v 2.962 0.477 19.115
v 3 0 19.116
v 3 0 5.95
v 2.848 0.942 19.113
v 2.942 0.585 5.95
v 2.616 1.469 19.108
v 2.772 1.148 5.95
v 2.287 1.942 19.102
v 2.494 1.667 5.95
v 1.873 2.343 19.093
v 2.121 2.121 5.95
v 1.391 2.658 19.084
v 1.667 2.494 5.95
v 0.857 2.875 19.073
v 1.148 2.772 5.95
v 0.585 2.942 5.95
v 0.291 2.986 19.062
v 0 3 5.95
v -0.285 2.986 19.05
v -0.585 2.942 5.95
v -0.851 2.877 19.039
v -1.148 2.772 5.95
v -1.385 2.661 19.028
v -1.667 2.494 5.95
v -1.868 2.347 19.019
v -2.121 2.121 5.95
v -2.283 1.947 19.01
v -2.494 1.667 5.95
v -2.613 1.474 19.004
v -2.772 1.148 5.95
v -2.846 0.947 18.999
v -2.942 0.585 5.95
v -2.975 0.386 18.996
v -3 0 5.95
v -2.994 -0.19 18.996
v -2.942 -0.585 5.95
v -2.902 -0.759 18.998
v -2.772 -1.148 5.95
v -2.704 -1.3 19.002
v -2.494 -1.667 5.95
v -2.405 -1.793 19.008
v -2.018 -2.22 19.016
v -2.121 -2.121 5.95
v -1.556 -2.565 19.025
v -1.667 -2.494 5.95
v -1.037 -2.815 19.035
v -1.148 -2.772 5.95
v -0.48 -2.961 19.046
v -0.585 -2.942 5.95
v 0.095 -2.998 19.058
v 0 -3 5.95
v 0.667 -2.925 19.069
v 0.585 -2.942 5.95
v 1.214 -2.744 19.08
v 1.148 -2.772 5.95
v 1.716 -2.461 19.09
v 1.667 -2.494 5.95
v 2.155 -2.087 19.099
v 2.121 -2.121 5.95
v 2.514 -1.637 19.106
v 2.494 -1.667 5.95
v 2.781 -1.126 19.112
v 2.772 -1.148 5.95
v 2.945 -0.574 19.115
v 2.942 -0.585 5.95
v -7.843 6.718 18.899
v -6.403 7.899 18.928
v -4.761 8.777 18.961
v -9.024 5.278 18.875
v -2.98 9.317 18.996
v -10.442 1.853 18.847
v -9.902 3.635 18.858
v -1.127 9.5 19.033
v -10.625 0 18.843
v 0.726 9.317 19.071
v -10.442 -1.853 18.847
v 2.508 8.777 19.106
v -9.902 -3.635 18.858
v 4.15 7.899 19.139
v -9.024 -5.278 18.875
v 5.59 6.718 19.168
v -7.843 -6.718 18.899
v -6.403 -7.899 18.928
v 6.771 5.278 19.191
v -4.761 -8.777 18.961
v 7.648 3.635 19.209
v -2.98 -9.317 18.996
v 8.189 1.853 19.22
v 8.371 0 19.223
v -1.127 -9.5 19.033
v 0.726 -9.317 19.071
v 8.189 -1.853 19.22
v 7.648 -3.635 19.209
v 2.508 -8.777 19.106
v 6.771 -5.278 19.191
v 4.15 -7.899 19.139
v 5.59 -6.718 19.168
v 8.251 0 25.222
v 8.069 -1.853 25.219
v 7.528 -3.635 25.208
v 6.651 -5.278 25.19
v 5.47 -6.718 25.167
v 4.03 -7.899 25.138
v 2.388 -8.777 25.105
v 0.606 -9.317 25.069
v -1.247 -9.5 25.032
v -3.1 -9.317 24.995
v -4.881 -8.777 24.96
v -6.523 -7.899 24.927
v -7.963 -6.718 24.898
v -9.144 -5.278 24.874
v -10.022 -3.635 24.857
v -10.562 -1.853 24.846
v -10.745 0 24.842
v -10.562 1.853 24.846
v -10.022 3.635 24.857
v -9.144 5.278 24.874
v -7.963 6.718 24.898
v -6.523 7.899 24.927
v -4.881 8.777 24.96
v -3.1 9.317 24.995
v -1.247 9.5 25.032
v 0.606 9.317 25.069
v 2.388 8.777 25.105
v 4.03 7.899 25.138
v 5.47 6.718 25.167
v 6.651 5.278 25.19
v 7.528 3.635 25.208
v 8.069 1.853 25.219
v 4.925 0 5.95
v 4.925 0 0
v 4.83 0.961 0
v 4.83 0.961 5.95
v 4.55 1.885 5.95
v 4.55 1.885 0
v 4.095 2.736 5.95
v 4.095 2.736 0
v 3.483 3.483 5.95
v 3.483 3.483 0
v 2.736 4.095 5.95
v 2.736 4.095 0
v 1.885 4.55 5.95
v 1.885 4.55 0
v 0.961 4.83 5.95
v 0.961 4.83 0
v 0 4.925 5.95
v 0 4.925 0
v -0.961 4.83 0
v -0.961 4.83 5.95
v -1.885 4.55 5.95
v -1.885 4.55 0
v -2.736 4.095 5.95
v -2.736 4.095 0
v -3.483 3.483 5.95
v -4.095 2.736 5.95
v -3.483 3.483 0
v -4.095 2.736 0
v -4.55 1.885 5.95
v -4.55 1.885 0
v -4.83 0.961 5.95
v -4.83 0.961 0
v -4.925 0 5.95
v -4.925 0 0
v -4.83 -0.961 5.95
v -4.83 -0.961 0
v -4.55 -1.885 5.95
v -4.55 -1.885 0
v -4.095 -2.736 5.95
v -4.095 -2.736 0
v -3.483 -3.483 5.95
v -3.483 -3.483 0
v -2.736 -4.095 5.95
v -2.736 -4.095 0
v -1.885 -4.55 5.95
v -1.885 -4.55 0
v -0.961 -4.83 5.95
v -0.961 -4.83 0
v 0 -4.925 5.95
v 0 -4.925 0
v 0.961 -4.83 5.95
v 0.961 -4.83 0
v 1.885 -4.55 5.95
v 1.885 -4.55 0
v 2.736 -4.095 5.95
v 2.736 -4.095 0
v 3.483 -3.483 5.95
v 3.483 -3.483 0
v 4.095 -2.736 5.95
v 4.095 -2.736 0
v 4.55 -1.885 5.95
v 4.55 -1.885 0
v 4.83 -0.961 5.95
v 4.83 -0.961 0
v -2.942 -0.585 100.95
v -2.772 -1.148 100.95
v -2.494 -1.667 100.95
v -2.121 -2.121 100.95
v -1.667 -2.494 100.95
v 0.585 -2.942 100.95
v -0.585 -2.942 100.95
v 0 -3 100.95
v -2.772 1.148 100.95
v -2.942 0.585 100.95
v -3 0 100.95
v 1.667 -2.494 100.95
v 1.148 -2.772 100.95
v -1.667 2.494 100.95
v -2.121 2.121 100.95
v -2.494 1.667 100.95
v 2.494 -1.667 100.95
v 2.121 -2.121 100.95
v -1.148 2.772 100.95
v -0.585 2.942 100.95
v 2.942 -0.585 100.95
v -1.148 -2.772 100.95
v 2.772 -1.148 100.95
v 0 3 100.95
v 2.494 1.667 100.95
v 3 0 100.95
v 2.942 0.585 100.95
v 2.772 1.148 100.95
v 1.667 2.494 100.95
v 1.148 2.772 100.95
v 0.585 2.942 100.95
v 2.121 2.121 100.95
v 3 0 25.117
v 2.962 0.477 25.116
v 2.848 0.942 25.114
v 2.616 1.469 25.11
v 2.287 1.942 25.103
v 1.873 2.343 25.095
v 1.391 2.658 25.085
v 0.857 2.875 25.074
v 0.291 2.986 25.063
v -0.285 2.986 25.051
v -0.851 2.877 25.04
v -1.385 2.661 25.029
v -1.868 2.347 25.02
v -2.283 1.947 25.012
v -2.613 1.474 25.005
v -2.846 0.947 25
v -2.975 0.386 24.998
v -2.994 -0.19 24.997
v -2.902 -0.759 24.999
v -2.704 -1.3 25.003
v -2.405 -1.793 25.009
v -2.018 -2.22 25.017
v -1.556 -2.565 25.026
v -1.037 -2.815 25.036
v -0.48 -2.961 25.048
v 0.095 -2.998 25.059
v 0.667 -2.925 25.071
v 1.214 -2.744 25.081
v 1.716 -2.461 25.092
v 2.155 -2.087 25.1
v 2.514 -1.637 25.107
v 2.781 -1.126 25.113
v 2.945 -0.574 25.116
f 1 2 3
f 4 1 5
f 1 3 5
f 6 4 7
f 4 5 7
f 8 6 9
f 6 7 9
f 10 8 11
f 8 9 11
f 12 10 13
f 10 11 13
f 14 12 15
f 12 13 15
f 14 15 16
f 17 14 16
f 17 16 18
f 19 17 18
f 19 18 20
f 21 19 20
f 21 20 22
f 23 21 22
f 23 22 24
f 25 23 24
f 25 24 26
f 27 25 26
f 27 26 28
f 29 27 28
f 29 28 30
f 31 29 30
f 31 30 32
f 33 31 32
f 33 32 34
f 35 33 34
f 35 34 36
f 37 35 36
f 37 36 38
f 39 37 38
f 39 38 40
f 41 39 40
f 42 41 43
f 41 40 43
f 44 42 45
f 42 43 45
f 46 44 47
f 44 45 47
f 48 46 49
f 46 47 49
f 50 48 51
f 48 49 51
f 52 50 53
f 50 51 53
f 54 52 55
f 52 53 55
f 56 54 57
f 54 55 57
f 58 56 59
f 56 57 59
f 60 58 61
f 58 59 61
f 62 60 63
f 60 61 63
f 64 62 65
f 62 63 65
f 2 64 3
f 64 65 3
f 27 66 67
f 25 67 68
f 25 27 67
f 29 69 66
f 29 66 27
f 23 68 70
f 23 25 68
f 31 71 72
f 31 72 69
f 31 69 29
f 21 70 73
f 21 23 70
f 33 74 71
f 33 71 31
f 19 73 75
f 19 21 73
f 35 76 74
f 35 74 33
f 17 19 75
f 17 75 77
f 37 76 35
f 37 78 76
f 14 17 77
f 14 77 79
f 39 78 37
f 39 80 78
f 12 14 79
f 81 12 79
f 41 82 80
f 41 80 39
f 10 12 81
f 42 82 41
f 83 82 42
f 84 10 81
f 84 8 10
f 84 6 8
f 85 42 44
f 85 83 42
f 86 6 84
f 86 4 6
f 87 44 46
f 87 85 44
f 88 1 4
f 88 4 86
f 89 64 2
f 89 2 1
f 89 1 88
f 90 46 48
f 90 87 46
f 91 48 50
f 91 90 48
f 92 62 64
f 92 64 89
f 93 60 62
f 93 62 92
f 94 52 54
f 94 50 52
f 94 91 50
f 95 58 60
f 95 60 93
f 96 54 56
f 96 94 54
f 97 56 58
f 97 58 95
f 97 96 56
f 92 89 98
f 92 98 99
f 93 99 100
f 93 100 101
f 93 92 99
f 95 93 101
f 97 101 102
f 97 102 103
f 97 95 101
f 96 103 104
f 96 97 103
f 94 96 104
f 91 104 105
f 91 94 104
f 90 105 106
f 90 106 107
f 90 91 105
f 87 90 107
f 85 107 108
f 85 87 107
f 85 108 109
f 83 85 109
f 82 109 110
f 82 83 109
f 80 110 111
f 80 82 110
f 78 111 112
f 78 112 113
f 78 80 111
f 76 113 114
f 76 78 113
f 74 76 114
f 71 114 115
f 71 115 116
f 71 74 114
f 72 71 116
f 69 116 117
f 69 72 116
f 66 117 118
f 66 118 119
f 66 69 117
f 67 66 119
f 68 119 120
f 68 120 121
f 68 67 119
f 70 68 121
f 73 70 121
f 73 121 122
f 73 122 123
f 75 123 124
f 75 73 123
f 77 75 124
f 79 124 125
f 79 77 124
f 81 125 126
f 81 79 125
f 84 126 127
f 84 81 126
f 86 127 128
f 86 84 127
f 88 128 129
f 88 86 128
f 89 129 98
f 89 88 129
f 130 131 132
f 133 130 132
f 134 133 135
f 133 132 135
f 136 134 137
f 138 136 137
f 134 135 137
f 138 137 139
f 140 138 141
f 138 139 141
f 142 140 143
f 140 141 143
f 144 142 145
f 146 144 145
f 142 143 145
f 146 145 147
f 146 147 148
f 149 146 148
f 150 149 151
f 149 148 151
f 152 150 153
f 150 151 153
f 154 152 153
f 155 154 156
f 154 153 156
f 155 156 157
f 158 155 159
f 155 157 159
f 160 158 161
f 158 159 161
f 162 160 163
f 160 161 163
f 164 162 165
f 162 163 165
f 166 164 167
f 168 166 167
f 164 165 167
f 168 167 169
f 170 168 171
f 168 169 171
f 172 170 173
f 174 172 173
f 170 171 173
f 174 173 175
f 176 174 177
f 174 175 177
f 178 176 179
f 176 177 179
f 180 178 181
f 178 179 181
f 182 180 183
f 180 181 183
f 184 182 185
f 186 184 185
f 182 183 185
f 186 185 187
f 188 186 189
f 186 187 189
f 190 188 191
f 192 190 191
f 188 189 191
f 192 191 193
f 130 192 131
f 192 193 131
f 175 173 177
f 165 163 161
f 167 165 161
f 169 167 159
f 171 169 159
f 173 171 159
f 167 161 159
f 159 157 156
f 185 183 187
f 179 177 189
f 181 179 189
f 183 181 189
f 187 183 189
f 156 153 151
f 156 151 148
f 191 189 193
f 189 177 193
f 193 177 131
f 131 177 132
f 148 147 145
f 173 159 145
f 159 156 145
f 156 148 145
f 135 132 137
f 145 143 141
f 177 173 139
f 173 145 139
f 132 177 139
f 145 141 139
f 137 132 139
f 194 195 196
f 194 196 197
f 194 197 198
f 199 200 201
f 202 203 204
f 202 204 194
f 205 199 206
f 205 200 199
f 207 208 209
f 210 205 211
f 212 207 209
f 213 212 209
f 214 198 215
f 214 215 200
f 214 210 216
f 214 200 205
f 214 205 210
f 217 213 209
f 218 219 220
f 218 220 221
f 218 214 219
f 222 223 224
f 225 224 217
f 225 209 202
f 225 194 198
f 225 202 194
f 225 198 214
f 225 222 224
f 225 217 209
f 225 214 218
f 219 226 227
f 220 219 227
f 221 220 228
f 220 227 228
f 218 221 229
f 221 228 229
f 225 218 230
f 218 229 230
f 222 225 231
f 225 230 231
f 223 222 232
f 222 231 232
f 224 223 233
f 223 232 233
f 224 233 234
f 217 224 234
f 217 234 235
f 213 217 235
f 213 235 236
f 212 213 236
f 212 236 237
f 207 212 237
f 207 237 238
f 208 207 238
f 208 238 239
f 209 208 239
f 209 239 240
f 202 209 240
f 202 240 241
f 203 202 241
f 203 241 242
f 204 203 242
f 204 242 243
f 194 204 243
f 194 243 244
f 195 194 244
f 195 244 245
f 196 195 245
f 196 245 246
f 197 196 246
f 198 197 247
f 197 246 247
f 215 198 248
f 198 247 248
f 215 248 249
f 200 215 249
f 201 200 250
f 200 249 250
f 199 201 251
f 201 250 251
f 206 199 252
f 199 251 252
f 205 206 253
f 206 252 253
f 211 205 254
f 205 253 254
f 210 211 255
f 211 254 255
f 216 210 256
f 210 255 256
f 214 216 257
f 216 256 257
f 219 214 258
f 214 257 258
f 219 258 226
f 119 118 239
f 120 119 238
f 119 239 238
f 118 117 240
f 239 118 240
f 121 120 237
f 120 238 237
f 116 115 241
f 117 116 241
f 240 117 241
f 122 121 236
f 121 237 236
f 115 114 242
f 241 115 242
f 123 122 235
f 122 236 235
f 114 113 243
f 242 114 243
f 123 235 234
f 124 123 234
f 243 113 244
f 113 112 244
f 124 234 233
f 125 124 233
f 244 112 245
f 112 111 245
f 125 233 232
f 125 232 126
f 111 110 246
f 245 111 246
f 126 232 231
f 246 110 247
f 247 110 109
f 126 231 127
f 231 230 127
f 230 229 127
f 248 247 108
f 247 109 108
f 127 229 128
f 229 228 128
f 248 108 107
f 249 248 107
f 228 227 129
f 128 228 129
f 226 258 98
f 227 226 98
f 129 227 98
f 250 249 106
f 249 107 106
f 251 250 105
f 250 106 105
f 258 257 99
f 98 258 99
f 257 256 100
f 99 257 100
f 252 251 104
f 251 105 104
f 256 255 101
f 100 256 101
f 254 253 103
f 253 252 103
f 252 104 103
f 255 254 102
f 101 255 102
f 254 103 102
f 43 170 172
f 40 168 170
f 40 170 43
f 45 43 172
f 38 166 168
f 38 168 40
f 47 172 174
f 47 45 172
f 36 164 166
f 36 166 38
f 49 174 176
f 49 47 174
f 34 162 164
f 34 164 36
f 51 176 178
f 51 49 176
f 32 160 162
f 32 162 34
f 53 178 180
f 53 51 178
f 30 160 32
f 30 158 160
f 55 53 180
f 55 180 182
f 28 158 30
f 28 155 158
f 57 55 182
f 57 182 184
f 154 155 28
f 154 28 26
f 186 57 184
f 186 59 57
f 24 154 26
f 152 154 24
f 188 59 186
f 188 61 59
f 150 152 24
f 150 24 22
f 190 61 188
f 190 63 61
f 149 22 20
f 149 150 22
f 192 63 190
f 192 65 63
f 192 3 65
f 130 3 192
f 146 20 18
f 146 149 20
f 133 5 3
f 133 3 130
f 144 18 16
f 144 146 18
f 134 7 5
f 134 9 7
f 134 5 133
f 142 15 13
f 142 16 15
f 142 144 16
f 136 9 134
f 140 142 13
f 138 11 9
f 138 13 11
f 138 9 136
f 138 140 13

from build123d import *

# Parameters (mm, degrees)
F0_R     = 4.925
F1_DEPTH = 5.95
F2_R     = 3
F3_DEPTH = 95
F6_R     = 9.5
F7_DEPTH = 6


# Not quite as in the source:
# - a feature of the source that left no trace in its solid (it failed there, or was rolled back) is left out


with BuildPart() as f1:
    # F0 (on Top) → F1 (new body)
    with BuildSketch(Plane.XY):
        Circle(F0_R)
    extrude(amount=F1_DEPTH)

    # F2 (on face) → F3 (join)
    with BuildSketch(Plane.XY.offset(5.95)):
        Circle(F2_R)
    extrude(amount=F3_DEPTH)

    # F6 (on face) → F7 (join)
    with BuildSketch(Plane(origin=(-0.3810464275, 0, 19.0483774936), x_dir=(0.9997999772, 0, 0.0200001396), z_dir=(0.0200001396, 0, -0.9997999772))):
        with Locations((-0.7457245374, 0)):
            Circle(F6_R)
    extrude(amount=-F7_DEPTH)


solid = f1.part
